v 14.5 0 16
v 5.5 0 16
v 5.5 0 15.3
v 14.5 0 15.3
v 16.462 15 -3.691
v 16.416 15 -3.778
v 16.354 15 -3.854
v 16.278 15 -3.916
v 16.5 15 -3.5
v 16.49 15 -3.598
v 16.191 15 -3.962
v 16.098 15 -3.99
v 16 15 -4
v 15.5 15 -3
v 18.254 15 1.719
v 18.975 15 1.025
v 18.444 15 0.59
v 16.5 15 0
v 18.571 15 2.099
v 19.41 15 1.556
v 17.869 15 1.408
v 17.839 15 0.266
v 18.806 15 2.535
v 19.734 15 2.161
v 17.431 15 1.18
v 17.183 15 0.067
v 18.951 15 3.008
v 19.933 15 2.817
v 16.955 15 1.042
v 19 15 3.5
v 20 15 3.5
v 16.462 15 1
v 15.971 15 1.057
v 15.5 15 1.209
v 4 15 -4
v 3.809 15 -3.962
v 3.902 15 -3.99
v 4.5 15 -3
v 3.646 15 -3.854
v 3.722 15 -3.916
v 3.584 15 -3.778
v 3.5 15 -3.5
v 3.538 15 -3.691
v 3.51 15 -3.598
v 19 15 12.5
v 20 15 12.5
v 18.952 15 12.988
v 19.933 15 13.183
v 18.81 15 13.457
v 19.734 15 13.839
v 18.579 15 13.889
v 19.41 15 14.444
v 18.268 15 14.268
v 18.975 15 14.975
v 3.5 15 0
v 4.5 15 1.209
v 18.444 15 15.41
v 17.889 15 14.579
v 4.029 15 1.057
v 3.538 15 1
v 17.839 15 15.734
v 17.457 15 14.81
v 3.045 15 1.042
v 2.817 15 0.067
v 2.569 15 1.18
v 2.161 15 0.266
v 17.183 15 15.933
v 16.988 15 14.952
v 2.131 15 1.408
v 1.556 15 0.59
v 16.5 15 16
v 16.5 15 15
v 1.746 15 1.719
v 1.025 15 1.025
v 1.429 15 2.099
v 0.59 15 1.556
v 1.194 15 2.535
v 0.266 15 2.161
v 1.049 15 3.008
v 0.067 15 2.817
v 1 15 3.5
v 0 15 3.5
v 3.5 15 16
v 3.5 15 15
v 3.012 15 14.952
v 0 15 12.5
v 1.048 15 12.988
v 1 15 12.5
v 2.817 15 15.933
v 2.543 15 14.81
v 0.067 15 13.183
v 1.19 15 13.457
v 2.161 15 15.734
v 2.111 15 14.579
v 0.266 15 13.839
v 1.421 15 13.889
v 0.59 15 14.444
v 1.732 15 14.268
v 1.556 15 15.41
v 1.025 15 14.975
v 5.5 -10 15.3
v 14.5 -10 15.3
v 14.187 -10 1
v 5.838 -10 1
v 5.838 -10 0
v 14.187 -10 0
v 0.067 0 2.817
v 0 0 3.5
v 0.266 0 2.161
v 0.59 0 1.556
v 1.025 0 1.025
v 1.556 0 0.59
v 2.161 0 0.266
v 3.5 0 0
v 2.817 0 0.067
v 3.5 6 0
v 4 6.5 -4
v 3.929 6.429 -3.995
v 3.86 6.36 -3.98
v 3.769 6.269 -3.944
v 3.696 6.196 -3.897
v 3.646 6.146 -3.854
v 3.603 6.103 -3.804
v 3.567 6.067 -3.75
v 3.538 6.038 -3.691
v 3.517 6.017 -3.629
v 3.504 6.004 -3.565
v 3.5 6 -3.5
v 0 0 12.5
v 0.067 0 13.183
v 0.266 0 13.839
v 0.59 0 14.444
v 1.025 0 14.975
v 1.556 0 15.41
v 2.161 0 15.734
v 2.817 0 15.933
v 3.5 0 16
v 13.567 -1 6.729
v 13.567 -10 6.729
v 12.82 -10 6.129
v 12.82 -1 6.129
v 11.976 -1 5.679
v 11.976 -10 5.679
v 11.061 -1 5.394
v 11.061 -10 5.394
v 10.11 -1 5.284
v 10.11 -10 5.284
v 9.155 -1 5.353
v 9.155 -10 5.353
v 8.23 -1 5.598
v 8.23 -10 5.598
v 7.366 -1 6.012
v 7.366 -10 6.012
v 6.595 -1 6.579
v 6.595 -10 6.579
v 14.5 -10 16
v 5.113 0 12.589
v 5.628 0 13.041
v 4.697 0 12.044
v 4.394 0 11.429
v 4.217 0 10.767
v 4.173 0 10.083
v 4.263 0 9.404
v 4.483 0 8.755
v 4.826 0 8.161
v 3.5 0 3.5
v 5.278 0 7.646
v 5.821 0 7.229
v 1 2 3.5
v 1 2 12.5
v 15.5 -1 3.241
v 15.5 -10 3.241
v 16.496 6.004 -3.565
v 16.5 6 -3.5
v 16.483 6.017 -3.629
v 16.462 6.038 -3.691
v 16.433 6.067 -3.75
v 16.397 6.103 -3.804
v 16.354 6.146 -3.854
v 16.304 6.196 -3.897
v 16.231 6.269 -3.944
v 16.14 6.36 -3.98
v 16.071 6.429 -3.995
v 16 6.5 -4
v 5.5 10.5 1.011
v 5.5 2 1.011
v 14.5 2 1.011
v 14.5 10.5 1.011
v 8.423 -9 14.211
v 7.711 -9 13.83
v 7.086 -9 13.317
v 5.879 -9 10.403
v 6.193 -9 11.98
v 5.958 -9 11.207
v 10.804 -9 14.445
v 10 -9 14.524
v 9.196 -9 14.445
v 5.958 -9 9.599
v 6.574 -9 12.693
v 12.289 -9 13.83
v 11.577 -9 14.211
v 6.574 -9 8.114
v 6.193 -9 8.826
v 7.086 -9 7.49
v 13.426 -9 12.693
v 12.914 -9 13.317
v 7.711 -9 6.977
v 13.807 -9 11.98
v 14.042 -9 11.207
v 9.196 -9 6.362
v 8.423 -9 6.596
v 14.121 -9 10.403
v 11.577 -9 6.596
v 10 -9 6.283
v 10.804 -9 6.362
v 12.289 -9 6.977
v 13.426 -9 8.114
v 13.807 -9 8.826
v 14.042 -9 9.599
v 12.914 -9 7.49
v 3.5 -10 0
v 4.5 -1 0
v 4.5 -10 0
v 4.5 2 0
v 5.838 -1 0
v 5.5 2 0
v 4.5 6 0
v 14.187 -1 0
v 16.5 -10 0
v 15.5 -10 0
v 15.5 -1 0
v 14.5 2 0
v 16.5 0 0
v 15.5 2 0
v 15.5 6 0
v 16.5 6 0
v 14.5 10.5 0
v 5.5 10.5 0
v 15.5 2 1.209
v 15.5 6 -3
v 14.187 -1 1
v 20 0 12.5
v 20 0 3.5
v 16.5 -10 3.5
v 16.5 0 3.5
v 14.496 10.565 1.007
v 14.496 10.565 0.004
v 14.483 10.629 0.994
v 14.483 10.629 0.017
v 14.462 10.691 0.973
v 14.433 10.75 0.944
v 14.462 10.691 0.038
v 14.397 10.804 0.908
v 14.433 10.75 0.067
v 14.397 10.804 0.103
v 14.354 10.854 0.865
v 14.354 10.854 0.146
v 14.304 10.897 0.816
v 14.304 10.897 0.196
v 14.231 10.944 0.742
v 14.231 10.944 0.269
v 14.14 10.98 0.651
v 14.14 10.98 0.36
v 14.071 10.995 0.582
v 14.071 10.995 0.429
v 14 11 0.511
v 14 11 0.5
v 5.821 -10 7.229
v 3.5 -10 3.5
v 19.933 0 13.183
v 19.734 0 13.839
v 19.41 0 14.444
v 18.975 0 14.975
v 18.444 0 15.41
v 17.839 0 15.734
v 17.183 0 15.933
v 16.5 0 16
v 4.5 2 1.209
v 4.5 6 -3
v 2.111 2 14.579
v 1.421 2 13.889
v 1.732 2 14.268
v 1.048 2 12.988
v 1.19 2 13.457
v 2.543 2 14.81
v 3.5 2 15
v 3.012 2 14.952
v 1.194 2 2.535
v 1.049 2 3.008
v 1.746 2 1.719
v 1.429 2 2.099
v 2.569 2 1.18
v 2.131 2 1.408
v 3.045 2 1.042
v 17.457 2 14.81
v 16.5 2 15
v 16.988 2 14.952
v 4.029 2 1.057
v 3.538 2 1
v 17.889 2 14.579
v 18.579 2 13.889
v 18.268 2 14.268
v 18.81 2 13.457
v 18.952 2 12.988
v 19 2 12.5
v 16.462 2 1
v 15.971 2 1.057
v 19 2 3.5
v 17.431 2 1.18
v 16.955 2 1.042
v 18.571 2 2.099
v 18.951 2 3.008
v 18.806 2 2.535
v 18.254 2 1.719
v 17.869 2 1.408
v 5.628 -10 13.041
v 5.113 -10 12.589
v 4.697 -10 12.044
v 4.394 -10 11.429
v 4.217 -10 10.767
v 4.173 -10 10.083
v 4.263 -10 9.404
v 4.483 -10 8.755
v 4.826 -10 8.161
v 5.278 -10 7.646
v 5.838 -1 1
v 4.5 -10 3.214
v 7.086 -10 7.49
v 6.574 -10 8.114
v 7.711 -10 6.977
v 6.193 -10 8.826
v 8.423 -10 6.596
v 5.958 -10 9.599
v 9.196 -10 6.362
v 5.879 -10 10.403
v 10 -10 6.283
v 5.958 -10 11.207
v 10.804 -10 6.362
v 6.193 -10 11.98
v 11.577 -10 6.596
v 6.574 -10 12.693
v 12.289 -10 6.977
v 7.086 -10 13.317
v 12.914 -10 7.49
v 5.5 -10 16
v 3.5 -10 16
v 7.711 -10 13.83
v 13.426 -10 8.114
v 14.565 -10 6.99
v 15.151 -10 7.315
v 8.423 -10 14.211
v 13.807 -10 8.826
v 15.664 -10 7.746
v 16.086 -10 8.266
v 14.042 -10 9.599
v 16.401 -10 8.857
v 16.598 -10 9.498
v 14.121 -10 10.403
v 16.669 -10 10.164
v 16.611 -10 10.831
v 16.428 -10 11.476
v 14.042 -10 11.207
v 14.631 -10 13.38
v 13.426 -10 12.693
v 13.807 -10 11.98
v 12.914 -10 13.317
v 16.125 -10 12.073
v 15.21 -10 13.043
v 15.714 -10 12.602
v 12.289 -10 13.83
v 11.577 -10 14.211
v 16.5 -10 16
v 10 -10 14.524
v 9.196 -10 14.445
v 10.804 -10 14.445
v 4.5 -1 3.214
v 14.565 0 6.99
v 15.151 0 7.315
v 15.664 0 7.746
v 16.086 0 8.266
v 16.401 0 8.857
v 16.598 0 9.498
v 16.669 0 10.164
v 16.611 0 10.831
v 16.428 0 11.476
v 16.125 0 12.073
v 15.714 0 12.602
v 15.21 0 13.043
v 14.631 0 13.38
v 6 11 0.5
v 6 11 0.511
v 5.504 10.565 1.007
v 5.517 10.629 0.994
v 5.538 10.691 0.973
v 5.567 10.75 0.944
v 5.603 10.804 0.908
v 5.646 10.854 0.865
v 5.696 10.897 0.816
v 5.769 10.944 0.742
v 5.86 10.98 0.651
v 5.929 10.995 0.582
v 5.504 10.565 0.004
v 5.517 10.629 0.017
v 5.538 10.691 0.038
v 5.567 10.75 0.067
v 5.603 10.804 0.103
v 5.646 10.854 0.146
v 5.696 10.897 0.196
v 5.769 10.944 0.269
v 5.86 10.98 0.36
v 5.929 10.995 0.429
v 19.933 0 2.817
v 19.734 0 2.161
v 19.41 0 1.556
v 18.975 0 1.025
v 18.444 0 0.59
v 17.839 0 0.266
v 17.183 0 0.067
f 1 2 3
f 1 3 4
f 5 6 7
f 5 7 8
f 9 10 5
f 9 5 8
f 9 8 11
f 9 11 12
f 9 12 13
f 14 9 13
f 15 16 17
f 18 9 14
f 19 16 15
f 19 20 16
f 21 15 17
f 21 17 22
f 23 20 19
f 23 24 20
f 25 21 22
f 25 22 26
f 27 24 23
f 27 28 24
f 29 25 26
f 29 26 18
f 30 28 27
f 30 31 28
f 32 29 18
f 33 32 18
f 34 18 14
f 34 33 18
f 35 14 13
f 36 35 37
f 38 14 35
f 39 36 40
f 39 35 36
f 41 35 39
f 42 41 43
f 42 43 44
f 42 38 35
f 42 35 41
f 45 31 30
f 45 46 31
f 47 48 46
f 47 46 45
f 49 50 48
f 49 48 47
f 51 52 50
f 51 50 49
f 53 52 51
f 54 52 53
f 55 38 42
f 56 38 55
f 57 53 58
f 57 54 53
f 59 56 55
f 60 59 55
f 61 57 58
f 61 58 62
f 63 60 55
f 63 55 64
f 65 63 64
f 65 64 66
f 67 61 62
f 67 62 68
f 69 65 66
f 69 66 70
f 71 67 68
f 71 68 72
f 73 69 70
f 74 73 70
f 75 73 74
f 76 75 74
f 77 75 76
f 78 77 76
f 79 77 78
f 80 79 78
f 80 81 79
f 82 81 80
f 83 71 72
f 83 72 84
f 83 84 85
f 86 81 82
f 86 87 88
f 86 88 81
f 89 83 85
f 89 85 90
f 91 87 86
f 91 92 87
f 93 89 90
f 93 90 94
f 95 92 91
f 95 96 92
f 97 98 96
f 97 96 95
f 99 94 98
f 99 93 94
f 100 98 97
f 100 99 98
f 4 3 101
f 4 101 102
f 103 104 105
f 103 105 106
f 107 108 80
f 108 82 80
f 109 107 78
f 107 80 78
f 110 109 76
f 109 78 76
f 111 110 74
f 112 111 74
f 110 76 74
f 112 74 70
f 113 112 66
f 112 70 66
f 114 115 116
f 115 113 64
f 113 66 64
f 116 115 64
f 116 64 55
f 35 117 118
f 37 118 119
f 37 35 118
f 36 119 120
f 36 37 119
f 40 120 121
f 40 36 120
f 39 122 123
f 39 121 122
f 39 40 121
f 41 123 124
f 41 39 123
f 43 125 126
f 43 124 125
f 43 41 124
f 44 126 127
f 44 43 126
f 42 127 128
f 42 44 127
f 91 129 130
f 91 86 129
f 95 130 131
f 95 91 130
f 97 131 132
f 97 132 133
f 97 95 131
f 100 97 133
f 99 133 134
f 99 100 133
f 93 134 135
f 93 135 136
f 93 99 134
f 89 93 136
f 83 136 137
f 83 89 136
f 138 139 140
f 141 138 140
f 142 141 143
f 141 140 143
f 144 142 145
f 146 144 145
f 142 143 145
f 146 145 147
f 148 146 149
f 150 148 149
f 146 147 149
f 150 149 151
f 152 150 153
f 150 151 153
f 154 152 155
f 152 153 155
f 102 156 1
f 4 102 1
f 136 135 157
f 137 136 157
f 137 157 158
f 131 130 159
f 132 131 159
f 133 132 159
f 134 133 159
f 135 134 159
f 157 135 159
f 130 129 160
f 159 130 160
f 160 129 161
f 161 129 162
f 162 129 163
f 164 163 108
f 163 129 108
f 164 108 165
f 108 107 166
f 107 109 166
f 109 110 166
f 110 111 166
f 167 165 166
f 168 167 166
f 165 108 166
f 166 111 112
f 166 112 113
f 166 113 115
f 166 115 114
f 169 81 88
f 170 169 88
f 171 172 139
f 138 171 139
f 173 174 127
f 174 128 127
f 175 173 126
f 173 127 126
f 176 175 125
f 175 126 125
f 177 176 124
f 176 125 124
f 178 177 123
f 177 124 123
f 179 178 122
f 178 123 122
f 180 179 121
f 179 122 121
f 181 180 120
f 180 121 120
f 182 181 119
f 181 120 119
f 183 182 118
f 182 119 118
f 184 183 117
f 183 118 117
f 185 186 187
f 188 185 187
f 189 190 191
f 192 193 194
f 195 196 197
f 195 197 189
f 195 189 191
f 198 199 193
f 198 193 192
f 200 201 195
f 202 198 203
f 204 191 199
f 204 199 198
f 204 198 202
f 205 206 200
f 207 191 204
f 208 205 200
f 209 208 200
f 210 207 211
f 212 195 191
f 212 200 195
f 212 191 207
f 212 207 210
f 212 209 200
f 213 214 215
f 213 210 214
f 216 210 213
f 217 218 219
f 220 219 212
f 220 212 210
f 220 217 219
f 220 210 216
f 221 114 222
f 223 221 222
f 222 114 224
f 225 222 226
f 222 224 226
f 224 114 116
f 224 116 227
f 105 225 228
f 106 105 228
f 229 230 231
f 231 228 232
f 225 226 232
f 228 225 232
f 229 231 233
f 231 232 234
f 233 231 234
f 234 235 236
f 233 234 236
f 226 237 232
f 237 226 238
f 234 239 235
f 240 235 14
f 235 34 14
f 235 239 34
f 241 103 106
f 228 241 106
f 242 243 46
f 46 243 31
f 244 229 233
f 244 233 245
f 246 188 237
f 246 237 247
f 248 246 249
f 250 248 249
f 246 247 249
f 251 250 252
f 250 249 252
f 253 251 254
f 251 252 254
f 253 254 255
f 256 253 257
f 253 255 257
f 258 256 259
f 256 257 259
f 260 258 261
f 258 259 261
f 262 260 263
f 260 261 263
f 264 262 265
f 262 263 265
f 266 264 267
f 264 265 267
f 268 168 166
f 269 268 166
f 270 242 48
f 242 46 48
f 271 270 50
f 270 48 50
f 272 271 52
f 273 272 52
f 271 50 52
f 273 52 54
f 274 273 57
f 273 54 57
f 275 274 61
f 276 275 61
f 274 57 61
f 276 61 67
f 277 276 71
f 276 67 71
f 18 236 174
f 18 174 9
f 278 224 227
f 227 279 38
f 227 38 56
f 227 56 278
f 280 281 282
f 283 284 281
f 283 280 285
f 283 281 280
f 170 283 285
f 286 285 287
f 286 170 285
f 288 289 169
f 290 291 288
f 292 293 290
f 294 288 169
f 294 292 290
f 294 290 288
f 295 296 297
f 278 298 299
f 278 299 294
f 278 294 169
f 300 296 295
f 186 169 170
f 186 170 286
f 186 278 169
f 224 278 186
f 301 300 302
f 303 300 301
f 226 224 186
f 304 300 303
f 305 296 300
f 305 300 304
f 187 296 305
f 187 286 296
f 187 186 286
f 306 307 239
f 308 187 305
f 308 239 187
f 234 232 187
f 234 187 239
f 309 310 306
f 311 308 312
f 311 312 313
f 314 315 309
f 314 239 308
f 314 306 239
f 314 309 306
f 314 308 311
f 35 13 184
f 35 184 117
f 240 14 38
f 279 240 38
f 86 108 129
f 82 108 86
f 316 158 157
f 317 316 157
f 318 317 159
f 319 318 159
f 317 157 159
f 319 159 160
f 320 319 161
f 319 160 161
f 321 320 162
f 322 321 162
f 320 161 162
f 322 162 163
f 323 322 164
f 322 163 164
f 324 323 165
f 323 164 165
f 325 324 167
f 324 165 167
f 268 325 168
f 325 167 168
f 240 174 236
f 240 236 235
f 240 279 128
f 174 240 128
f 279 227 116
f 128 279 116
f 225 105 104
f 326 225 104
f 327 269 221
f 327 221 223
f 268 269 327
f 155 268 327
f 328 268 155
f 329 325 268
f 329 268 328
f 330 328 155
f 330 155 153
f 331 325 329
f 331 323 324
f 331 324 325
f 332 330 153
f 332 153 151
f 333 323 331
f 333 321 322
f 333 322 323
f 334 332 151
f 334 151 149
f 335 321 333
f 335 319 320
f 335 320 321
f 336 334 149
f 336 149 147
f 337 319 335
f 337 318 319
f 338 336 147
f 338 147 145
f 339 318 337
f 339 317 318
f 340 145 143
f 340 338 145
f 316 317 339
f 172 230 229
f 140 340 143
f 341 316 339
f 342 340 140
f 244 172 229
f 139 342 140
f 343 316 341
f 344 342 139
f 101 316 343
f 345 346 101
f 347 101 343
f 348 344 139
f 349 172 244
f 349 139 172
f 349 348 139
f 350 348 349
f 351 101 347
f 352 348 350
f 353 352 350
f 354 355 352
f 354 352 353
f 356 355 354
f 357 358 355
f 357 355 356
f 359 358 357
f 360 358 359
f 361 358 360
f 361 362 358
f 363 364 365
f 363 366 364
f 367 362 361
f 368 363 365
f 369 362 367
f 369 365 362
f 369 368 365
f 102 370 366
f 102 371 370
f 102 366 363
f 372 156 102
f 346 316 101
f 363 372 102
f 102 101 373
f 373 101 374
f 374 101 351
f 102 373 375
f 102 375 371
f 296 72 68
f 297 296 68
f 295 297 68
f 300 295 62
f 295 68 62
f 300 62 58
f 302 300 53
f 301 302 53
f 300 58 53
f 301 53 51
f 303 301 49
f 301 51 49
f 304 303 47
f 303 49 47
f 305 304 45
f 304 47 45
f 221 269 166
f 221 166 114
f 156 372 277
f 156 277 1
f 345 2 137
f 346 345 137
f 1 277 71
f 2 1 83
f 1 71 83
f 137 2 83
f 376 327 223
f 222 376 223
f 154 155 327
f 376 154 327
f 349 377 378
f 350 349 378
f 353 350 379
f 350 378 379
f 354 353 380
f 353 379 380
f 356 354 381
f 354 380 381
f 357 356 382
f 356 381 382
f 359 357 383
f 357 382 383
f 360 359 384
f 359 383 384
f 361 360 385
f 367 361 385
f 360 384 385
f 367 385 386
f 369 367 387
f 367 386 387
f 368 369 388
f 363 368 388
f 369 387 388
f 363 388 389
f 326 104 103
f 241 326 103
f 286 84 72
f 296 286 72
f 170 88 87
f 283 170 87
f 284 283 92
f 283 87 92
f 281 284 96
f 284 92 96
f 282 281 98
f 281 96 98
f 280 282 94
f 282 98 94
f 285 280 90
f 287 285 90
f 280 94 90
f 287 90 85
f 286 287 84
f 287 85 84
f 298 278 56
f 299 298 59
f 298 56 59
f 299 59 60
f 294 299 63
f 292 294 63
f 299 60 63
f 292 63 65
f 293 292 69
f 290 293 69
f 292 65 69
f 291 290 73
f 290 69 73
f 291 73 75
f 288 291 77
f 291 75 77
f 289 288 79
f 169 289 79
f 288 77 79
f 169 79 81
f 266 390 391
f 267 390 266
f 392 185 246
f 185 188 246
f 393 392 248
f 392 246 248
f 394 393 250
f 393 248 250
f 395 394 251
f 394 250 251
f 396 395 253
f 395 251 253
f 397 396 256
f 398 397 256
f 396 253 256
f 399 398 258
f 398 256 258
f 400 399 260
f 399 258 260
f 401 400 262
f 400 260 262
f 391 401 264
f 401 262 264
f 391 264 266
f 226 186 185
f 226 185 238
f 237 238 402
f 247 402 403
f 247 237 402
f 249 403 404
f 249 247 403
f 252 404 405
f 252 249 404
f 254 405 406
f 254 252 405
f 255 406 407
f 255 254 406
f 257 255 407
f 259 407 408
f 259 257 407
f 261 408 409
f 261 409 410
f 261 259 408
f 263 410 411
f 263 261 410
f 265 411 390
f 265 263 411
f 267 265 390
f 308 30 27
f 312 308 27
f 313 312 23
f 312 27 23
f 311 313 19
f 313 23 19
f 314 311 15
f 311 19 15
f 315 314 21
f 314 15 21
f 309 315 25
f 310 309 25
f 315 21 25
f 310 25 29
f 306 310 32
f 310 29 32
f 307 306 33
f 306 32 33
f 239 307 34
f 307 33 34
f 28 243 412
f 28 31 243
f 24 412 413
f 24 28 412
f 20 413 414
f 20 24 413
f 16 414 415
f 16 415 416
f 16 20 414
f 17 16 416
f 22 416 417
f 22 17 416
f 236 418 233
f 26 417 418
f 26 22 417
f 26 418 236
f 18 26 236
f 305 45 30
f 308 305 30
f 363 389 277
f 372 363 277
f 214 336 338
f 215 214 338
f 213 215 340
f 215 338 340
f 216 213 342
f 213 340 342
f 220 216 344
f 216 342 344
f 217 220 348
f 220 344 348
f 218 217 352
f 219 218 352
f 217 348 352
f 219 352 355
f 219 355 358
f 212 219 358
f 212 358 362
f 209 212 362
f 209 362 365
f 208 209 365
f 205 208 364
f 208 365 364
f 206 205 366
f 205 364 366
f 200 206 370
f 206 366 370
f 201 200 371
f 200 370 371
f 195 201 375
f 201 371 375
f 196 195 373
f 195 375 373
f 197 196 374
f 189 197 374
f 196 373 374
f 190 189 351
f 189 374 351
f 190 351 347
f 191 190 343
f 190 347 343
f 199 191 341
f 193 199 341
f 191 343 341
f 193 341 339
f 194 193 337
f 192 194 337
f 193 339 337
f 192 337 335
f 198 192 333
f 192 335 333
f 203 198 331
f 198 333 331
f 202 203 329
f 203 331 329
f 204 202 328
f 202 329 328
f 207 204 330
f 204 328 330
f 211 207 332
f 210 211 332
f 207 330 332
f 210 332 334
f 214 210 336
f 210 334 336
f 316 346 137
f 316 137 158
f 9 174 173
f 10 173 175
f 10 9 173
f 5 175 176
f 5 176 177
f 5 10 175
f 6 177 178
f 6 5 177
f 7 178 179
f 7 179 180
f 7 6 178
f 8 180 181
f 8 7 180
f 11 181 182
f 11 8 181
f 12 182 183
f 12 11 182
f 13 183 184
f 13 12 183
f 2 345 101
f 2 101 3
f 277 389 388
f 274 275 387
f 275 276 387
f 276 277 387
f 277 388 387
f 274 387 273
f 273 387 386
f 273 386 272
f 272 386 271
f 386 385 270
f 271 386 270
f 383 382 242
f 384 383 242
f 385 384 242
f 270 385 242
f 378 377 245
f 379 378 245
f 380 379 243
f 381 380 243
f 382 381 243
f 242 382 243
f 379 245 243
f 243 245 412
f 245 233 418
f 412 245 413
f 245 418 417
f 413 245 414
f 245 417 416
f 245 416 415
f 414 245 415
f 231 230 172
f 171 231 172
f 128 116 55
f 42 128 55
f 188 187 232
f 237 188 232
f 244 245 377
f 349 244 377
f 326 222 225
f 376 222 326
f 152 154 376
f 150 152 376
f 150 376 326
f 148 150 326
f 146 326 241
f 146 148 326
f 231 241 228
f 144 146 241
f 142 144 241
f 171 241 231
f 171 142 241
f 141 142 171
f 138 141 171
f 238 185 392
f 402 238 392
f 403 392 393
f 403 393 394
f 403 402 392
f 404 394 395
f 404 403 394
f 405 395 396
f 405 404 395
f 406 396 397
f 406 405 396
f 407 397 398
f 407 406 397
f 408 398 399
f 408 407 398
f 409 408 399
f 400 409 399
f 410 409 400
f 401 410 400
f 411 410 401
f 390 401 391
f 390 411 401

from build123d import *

# Parameters (mm, degrees)
SKETCH_1_W          = 20
SKETCH_1_H          = 15
EXTRUDE_1_DEPTH     = 16
FILLET_1_R          = 3.5
SKETCH_2_W          = 13
SKETCH_2_H          = 9
EXTRUDE_2_DEPTH     = 4
FILLET_2_R          = 0.5
EXTRUDE_3_DEPTH     = 10
SKETCH_4_W          = 9
SKETCH_4_H          = 10
CUT_EXTRUDE_2_DEPTH = 0.7
SKETCH_5_R          = 4.120834068
CUT_EXTRUDE_3_DEPTH = 1
CUT_EXTRUDE_5_DEPTH = 13
SKETCH_7_W          = 9
SKETCH_7_H          = 1.011185769
EXTRUDE_4_DEPTH     = 9
FILLET_3_R          = 0.5
CUT_EXTRUDE_6_DEPTH = 9


with BuildPart() as part:
    # ｽｹｯﾁ1 → ﾎﾞｽ - 押し出し1 (new body)
    with BuildSketch(Plane.XY):
        with Locations((10, 7.5)):
            Rectangle(SKETCH_1_W, SKETCH_1_H)
    extrude(amount=EXTRUDE_1_DEPTH)

    # ﾌｨﾚｯﾄ1
    fillet_1_edges = [part.edges().sort_by_distance(p)[0] for p in [
        (20, 7.5, 16),
        (0, 7.5, 16),
        (20, 7.5, 0),
        (0, 7.5, 0),
    ]]
    fillet(fillet_1_edges, radius=FILLET_1_R)

    # ｽｹｯﾁ2 → ﾎﾞｽ - 押し出し2 (add)
    with BuildSketch(Plane(origin=(0, 0, 0), x_dir=(-1, 0, 0), z_dir=(0, 0, -1))):
        with Locations((-10, 10.5)):
            Rectangle(SKETCH_2_W, SKETCH_2_H)
    extrude(amount=EXTRUDE_2_DEPTH)

    # ﾌｨﾚｯﾄ2
    fillet_2_edges = [part.edges().sort_by_distance(p)[0] for p in [
        (16.5, 10.5, -4),
        (10, 6, -4),
        (3.5, 10.5, -4),
    ]]
    fillet(fillet_2_edges, radius=FILLET_2_R)

    # ｽｹｯﾁ3 → ﾎﾞｽ - 押し出し3 (add)
    with BuildSketch(Plane.XZ):
        with BuildLine():
            Line((3.5, 16), (5.627627053, 13.041328389))
            ThreePointArc((5.627627053, 13.041328389), (4.172978297, 10.083248698), (5.821248207, 7.228525459))
            Line((5.821248207, 7.228525459), (3.5, 3.5))
            Line((3.5, 3.5), (3.5, 0))
            Line((3.5, 0), (16.5, 0))
            Line((16.5, 0), (16.5, 3.5))
            Line((16.5, 3.5), (14.565352324, 6.9904115))
            ThreePointArc((14.565352324, 6.9904115), (16.668731913, 10.163952157), (14.630738056, 13.379873028))
            Line((14.630738056, 13.379873028), (16.5, 16))
            Line((16.5, 16), (3.5, 16))
        make_face()
    extrude(amount=EXTRUDE_3_DEPTH)

    # ｽｹｯﾁ4 → ｶｯﾄ - 押し出し2 (cut)
    with BuildSketch(Plane.XY.offset(16)):
        with Locations((10, -5)):
            Rectangle(SKETCH_4_W, SKETCH_4_H)
    extrude(amount=-CUT_EXTRUDE_2_DEPTH, mode=Mode.SUBTRACT)

    # ｽｹｯﾁ5 → ｶｯﾄ - 押し出し3 (cut)
    with BuildSketch(Plane.XZ.offset(10)):
        with Locations(Location((10, 10.403392153, 0), (0, 0, 270))):
            Circle(SKETCH_5_R)
    extrude(amount=-CUT_EXTRUDE_3_DEPTH, mode=Mode.SUBTRACT)

    # ｽｹｯﾁ6 → ｶｯﾄ - 押し出し5 (cut)
    with BuildSketch(Plane(origin=(0, 15, 0), x_dir=(1, 0, 0), z_dir=(0, 1, 0))):
        with BuildLine():
            Line((15.5, 3), (4.5, 3))
            Line((4.5, 3), (4.5, -1.208712153))
            ThreePointArc((4.5, -1.208712153), (2.130693606, -1.408349934), (1, -3.5))
            Line((1, -3.5), (1, -12.5))
            ThreePointArc((1, -12.5), (1.732233047, -14.267766953), (3.5, -15))
            Line((3.5, -15), (16.5, -15))
            ThreePointArc((16.5, -15), (18.267766953, -14.267766953), (19, -12.5))
            Line((19, -12.5), (19, -3.5))
            ThreePointArc((19, -3.5), (17.869306394, -1.408349934), (15.5, -1.208712153))
            Line((15.5, -1.208712153), (15.5, 3))
        make_face()
    extrude(amount=-CUT_EXTRUDE_5_DEPTH, mode=Mode.SUBTRACT)

    # ｽｹｯﾁ7 → ﾎﾞｽ - 押し出し4 (add)
    with BuildSketch(Plane(origin=(0, 2, 0), x_dir=(1, 0, 0), z_dir=(0, 1, 0))):
        with Locations((10, -0.505592885)):
            Rectangle(SKETCH_7_W, SKETCH_7_H)
    extrude(amount=EXTRUDE_4_DEPTH)

    # ﾌｨﾚｯﾄ3
    fillet_3_edges = [part.edges().sort_by_distance(p)[0] for p in [
        (5.5, 11, 0.505592885),
        (10, 11, 1.011185769),
        (14.5, 11, 0.505592885),
        (10, 11, 0),
    ]]
    fillet(fillet_3_edges, radius=FILLET_3_R)

    # ｽｹｯﾁ8 → ｶｯﾄ - 押し出し6 (cut)
    with BuildSketch(Plane.XZ.offset(10)):
        with BuildLine():
            Line((4.5, 1), (4.5, 0))
            Line((4.5, 0), (5.838412619, 0))
            Line((5.838412619, 0), (5.838412619, 1))
            Line((5.838412619, 1), (14.187040515, 1))
            Line((14.187040515, 1), (14.187040515, 0))
            Line((14.187040515, 0), (15.5, 0))
            Line((15.5, 0), (15.5, 1))
            Line((15.5, 1), (15.5, 3.241396329))
            Line((15.5, 3.241396329), (13.566856979, 6.729093192))
            ThreePointArc((13.566856979, 6.729093192), (10.11032626, 5.283746689), (6.594740038, 6.578846932))
            Line((6.594740038, 6.578846932), (4.5, 3.214152221))
            Line((4.5, 3.214152221), (4.5, 1))
        make_face()
    extrude(amount=-CUT_EXTRUDE_6_DEPTH, mode=Mode.SUBTRACT)


solid = part.part
